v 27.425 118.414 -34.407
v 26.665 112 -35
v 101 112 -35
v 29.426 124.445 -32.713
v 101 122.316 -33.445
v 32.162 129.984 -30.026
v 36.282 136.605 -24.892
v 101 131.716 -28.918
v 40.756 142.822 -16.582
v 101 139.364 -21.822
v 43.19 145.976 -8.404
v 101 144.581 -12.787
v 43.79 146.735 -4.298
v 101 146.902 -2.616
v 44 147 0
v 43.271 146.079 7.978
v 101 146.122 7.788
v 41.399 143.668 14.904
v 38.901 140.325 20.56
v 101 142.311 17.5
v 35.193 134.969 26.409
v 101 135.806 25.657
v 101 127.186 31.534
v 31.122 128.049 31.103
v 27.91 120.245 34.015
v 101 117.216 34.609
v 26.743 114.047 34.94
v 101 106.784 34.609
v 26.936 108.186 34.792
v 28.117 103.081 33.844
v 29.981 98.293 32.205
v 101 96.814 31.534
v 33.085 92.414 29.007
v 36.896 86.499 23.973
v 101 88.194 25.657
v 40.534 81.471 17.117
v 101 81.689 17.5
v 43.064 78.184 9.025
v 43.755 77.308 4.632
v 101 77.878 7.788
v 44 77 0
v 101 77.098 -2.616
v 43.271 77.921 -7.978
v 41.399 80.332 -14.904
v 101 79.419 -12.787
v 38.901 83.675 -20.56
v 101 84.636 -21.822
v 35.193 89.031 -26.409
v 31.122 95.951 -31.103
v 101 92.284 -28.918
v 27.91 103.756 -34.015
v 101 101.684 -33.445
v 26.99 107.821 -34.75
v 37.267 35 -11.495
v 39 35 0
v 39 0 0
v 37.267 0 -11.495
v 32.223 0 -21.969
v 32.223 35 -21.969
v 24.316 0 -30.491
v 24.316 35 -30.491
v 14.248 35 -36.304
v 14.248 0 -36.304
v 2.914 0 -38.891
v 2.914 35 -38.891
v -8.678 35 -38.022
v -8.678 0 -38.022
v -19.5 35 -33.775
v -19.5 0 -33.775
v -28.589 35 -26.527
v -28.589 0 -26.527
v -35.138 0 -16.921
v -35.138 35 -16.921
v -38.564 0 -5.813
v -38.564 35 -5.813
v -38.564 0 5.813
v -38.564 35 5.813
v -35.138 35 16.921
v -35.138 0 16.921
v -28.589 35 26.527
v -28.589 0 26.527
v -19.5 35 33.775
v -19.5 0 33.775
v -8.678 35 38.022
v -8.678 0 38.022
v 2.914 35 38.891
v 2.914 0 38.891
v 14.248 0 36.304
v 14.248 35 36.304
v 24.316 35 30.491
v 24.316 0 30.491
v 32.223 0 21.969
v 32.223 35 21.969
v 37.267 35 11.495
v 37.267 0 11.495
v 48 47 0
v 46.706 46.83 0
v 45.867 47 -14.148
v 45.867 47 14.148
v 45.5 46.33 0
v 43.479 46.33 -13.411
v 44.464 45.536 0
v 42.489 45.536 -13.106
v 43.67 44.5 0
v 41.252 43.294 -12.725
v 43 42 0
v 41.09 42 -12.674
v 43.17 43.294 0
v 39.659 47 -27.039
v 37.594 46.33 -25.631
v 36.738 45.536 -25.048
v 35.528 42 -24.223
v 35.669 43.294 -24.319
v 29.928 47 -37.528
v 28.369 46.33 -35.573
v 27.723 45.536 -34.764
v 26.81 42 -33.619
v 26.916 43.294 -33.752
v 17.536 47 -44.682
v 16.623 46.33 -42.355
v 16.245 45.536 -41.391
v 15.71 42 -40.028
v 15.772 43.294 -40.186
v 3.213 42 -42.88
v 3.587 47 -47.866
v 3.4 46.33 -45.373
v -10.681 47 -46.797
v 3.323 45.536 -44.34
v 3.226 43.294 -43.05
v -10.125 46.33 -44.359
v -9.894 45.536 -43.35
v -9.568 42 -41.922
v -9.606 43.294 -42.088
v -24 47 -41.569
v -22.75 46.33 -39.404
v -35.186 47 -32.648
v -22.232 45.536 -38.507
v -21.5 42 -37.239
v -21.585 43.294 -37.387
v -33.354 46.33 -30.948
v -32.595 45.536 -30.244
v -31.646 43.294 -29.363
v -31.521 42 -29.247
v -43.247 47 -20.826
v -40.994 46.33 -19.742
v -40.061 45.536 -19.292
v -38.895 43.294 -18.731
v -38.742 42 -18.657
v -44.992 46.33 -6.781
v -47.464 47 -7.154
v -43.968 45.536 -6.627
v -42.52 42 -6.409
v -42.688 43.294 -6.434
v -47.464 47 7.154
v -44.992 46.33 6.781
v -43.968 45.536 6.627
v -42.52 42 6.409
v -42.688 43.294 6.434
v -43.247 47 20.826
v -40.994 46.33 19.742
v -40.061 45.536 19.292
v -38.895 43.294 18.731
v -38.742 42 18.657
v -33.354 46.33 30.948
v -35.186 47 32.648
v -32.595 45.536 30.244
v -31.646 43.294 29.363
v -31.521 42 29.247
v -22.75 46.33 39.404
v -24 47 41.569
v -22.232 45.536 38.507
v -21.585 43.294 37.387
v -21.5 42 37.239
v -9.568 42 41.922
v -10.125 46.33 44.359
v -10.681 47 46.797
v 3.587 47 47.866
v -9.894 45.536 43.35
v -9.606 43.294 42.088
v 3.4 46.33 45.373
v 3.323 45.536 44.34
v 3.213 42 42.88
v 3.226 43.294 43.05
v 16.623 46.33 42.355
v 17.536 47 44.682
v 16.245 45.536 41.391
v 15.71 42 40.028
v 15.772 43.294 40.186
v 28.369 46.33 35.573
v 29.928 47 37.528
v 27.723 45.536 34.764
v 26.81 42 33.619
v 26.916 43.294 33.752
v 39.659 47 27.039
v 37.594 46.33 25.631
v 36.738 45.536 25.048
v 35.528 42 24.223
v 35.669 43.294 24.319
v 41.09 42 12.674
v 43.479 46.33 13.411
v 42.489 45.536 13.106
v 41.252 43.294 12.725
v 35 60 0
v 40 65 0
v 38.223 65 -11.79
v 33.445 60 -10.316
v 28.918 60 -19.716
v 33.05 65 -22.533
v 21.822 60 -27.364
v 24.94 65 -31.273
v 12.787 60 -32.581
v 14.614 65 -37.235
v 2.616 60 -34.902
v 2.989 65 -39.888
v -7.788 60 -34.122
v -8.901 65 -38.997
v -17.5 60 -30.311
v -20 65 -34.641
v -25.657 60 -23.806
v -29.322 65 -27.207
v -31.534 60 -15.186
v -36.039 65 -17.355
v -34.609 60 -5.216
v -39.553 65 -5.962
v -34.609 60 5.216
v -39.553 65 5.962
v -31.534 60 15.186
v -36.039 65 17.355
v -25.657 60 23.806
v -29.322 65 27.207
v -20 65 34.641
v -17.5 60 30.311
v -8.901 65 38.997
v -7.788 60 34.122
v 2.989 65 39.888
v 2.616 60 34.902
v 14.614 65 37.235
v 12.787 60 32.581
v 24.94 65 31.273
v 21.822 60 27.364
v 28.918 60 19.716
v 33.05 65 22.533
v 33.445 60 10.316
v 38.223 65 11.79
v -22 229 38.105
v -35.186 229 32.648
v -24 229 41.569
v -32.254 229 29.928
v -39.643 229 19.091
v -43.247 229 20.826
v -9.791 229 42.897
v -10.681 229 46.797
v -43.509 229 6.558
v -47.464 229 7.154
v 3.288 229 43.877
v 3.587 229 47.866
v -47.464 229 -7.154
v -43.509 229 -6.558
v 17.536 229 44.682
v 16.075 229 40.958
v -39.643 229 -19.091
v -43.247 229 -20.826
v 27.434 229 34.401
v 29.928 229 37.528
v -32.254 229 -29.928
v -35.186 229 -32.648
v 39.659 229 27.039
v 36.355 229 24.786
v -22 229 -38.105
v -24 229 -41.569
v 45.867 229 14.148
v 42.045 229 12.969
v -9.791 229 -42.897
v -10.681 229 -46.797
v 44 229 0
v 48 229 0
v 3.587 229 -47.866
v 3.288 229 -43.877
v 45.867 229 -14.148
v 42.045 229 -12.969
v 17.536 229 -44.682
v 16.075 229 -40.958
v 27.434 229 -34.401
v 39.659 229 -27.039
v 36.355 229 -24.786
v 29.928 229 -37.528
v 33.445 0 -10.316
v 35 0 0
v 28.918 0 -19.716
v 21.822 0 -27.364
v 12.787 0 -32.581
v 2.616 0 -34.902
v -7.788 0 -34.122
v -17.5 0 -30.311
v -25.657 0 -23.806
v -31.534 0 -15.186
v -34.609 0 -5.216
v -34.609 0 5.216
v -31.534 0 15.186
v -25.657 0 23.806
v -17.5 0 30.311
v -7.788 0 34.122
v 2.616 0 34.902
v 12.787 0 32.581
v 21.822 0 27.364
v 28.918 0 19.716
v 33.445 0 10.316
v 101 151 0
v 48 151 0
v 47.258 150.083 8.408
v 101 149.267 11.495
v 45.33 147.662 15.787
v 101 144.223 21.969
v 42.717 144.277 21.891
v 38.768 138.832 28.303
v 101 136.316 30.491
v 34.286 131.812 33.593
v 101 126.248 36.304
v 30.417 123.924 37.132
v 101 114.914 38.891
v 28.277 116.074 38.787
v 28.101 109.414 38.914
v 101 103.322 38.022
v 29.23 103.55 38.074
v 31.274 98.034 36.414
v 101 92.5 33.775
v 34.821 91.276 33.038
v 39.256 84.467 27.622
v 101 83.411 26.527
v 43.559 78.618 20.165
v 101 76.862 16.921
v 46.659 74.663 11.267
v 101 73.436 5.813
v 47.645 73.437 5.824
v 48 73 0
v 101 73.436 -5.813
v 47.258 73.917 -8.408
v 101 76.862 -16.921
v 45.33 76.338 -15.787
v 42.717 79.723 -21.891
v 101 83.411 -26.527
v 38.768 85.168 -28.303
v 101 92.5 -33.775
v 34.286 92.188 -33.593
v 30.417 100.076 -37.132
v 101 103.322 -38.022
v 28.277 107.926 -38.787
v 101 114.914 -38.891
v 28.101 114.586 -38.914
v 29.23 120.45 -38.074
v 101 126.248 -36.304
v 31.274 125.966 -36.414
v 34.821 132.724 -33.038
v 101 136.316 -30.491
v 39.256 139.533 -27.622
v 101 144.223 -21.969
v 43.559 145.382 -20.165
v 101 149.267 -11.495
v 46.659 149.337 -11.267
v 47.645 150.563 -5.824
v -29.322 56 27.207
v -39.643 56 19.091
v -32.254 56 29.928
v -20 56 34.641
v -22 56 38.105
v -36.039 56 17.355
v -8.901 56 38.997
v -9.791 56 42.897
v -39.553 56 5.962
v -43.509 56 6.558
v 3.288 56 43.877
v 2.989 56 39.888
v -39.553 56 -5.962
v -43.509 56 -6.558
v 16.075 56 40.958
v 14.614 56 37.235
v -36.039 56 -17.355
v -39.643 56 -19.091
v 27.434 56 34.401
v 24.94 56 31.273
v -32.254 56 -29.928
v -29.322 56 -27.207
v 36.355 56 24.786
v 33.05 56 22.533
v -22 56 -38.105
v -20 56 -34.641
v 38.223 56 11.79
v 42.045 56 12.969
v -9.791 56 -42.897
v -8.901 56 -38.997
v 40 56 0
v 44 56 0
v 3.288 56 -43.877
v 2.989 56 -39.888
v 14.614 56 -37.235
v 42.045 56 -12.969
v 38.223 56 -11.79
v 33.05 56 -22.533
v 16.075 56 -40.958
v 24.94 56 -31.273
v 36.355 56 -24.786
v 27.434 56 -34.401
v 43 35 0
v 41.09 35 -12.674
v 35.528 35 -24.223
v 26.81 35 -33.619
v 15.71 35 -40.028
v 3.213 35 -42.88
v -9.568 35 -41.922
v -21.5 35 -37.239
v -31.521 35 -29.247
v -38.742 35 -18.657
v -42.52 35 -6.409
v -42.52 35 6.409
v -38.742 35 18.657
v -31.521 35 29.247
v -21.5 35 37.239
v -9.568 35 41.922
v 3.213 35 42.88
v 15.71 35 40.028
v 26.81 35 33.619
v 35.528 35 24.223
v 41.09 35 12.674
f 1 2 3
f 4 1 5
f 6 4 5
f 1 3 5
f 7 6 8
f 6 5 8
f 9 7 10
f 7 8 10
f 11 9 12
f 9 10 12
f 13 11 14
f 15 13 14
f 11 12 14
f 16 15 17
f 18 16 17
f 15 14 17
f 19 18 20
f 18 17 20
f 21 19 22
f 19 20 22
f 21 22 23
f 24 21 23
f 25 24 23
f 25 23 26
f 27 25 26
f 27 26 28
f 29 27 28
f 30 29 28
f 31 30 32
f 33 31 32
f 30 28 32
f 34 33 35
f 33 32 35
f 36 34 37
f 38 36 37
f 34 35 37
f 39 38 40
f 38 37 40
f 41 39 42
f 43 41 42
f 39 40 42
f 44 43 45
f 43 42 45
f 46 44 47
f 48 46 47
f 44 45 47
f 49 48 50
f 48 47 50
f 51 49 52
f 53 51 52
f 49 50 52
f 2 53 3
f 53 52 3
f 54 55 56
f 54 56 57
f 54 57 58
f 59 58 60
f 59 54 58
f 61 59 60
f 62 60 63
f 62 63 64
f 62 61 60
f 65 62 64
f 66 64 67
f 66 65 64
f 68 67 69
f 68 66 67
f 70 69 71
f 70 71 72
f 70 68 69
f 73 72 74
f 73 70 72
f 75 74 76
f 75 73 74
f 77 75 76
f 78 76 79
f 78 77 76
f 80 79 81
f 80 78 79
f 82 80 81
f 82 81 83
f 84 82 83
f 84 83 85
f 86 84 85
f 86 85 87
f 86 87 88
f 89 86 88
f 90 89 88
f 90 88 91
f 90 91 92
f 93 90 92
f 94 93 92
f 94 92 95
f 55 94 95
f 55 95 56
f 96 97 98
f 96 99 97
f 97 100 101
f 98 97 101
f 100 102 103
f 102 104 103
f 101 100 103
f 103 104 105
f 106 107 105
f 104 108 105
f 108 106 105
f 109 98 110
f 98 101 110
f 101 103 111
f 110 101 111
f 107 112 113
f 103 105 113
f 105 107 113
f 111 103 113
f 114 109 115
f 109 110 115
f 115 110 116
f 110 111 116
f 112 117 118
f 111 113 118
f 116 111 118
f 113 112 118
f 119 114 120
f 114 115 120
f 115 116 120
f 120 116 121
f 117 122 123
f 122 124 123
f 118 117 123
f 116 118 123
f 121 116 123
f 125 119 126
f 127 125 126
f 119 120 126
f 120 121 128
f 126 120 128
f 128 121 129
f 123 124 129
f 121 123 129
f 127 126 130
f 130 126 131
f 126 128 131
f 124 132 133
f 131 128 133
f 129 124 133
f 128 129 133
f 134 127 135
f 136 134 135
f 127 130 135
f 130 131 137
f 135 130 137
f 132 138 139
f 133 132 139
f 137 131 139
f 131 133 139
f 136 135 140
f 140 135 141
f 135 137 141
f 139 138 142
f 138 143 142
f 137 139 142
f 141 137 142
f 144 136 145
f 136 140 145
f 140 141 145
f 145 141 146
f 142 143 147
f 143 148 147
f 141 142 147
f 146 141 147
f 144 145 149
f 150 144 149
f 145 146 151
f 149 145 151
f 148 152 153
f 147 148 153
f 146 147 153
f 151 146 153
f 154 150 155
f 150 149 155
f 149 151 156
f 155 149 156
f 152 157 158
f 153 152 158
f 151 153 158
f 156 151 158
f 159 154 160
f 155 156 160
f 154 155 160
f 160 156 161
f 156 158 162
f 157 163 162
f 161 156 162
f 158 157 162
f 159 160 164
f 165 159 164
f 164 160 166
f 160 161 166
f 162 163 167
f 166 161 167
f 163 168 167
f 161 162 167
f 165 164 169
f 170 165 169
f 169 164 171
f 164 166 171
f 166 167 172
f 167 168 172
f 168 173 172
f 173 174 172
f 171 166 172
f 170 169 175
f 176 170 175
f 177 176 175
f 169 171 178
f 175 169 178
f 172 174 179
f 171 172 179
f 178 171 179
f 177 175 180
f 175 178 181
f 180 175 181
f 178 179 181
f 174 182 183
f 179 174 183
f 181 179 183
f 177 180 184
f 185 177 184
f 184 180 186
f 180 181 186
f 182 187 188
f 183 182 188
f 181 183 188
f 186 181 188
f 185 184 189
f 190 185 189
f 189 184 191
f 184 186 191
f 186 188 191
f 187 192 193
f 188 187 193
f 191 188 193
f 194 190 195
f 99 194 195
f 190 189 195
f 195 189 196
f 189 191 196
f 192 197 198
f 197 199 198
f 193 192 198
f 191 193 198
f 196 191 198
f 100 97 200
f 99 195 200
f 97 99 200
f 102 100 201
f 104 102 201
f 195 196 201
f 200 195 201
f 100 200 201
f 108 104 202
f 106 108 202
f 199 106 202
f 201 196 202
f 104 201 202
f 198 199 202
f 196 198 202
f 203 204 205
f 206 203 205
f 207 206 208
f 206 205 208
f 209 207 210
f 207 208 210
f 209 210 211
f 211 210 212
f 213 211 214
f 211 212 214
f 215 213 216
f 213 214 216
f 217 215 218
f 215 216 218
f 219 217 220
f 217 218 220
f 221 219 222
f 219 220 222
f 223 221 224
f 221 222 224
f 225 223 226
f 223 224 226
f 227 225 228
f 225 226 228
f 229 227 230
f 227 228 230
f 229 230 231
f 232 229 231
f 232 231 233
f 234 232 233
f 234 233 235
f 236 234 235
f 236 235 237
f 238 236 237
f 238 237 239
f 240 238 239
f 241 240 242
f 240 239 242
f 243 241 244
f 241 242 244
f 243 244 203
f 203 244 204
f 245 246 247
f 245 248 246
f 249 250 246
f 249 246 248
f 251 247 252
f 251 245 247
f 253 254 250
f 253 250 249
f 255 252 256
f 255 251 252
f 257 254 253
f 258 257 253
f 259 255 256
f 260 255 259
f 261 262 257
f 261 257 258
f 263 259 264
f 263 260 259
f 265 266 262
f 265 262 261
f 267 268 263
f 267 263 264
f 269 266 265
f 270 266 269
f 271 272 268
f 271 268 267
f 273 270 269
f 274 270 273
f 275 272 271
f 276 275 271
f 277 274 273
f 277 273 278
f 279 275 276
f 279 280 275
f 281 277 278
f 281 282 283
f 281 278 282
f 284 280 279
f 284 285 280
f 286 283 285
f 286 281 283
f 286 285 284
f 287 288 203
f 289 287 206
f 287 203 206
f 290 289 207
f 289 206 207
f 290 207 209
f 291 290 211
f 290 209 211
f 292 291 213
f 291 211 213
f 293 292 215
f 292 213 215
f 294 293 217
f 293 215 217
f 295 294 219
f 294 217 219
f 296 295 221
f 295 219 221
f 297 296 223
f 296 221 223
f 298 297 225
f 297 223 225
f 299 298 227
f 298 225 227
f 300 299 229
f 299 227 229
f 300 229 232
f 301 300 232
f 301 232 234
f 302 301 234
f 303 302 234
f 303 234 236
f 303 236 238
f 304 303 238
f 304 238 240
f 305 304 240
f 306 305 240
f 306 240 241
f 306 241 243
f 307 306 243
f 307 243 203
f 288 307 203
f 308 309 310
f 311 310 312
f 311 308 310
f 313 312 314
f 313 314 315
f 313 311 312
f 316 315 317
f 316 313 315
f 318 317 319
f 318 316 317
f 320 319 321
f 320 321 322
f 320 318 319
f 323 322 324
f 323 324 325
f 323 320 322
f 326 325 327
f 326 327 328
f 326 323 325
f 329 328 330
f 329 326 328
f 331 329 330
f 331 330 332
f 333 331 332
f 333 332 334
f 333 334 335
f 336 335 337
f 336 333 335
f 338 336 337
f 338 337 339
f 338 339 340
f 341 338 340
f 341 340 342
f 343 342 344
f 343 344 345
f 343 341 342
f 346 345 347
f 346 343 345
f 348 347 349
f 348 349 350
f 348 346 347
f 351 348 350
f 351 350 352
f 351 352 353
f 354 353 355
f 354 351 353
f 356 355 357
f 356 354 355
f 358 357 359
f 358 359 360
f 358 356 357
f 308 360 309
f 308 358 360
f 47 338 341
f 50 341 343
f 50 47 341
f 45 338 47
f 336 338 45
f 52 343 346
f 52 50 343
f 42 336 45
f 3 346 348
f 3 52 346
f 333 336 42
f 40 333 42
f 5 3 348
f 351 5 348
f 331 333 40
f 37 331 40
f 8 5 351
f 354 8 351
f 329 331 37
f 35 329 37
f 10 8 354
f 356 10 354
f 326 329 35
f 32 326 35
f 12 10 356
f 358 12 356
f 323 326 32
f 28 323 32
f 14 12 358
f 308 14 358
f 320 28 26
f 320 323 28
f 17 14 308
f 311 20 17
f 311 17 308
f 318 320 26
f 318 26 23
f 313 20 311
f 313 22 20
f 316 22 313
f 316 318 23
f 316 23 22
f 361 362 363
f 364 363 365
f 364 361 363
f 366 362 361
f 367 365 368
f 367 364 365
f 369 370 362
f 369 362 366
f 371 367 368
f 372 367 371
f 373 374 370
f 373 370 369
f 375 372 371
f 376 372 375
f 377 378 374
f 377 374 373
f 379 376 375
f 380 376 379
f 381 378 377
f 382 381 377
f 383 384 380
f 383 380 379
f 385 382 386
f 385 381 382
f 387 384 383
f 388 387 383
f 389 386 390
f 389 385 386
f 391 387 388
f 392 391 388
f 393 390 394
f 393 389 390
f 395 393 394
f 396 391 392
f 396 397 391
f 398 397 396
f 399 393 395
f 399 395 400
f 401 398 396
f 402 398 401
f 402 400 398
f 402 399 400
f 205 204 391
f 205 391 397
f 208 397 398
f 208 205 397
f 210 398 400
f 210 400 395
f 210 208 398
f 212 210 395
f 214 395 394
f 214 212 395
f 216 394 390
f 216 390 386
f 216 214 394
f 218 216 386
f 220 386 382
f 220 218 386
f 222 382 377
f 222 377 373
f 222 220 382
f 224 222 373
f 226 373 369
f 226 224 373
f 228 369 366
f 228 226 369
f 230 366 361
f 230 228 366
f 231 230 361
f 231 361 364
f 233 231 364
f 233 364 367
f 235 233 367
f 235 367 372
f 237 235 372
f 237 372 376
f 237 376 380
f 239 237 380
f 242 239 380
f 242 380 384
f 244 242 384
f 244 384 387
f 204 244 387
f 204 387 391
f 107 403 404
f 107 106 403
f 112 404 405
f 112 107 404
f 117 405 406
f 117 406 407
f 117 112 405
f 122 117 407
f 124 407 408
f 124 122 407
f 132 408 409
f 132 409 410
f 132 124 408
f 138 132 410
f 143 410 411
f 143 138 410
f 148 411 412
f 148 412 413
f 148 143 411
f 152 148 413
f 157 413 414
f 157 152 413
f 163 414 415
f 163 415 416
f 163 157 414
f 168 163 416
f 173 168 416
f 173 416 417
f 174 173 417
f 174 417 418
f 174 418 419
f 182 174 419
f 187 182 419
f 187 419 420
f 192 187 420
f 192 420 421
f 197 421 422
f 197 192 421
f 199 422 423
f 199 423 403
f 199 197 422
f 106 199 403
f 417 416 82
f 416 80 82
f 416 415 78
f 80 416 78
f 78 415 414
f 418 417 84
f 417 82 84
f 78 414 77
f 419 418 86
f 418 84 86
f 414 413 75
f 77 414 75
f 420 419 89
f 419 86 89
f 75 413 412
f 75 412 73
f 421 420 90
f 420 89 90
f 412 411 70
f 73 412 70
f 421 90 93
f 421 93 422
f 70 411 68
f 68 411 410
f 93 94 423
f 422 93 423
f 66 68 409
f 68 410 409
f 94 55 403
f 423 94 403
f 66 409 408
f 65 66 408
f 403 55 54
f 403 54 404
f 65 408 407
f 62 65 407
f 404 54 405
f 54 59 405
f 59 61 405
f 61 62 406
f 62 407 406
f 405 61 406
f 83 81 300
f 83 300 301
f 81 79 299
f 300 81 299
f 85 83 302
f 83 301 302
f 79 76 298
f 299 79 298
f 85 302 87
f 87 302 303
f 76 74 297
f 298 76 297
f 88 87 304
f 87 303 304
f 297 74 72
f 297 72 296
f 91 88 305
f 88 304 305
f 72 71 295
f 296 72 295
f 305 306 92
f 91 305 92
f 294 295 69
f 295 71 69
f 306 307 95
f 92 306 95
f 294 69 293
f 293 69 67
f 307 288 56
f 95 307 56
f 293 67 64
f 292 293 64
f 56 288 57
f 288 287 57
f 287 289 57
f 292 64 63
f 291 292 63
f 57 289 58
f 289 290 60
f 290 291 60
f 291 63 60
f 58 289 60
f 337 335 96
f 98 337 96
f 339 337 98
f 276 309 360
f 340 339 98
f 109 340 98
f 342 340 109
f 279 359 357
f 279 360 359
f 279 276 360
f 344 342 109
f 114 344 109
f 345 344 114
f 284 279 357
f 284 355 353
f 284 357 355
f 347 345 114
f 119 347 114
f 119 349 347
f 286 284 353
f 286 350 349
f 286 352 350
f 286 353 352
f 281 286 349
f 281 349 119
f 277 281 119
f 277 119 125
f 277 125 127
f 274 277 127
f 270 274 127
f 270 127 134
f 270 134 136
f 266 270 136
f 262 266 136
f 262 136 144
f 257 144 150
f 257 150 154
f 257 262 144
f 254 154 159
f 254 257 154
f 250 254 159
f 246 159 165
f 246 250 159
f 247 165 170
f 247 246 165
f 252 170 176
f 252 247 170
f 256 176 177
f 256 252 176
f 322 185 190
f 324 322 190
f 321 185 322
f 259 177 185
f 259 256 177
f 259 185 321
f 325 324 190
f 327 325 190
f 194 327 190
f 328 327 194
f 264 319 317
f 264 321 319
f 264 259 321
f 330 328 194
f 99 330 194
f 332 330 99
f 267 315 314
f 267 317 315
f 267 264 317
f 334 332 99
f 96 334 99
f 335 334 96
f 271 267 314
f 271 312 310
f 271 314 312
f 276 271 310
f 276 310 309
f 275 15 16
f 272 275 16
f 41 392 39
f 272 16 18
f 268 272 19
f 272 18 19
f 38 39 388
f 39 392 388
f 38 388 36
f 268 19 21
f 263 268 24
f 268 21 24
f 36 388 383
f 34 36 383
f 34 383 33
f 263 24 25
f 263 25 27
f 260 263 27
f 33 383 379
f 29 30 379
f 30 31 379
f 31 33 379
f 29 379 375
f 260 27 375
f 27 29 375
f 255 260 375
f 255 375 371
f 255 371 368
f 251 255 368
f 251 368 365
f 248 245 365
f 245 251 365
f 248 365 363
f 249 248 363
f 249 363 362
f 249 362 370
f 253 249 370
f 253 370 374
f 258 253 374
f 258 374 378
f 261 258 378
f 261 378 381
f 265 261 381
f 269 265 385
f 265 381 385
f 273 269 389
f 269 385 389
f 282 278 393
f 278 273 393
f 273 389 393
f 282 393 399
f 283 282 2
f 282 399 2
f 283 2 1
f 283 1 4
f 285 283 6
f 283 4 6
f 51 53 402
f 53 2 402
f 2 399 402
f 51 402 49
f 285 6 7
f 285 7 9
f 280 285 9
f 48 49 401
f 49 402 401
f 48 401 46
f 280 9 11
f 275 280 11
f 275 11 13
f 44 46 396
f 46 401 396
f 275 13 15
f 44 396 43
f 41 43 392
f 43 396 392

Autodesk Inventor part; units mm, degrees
ref_plane "XZ Plane" through (0, 0, 0) normal (0, 1, 0) x (-1, 0, 0)
ref_plane "XY Plane" through (0, 0, 0) normal (0, 0, 1) x (1, 0, 0)
sketch "Boceto1" plane through (0, 0, 0) normal (0, 0, 1) x (1, 0, 0)
  line L0 (0, 0) -> (39, 0) construction
  line L1 (39, 0) -> (39, 35)
  line L2 (39, 35) -> (43, 35)
  line L3 (43, 35) -> (43, 42)
  arc A0 (48, 47) -> (43, 42) centre (48, 42) ccw
  line L4 (48, 47) -> (48, 229)
  line L5 (0, 0) -> (0, 229) construction
  line L6 (48, 229) -> (44, 229)
  line L7 (0, 112) -> (48, 112) construction
  line L8 (48, 112) -> (48, 77) construction
  line L9 (48, 77) -> (48, 56) construction
  line L10 (44, 229) -> (44, 56)
  line L11 (44, 56) -> (40, 56)
  line L12 (40, 56) -> (40, 65)
  line L13 (40, 65) -> (35, 60)
  line L14 (39, 0) -> (35, 0)
  line L15 (35, 0) -> (35, 60)
  dimension "d0" = 39
  dimension "d1" = 35
  dimension "d2" = 4
  dimension "d7" = 5
  dimension "d9" = 229
  dimension "d10" = 12
  dimension "d11" = 5
  dimension "d12" = 182
  dimension "d13" = 4
  dimension "d14" = 117
  dimension "d15" = 35
  dimension "d16" = 21
  dimension "d17" = 4
  dimension "d18" = 9
  dimension "d19" = 45
  dimension "d20" = 4
  dimension "d21" = 173
revolve "Revolución1" add sketch "Boceto1" angle 360 about axis through (0, 0, 0) along (0, 1, 0)
sketch "Boceto2" plane through (0, 0, 0) normal (0, 0, 1) x (1, 0, 0)
  line L0 (48, 229) -> (-48, 229) projected
  line L1 (48, 47) -> (-48, 47) projected
  line L2 (39, 35) -> (-39, 35) projected
  line L3 (39, 0) -> (-39, 0) projected
  line L4 (0, 0) -> (0, 112) construction
  line L5 (0, 112) -> (101, 112) construction
  dimension "d23" = 112
  dimension "d24" = 101
ref_plane "Plano de trabajo1" through (101, 112, 0) normal (1, 0, 0) x (0, 1, 0)
sketch "Boceto3" plane through (101, 112, 0) normal (1, 0, 0) x (0, 1, 0)
  circle A0 centre (0, 0) radius 39
  point P0 (-112, 0)
  dimension "d25" = 78
  dimension "d26" = 112
extrude "Extrusión1" add sketch "Boceto3" against normal up to surface
sketch "Boceto4" plane through (101, 112, 0) normal (1, 0, 0) x (0, 0, -1)
  circle A0 centre (0, 0) radius 35
  circle A1 centre (0, 0) radius 39 projected
  point P0 (0, -112)
  dimension "d29" = 70
  dimension "d30" = 4
extrude "Extrusión2" cut sketch "Boceto4" against normal up to surface contours A0
properties part number "7_Cuerpo"
